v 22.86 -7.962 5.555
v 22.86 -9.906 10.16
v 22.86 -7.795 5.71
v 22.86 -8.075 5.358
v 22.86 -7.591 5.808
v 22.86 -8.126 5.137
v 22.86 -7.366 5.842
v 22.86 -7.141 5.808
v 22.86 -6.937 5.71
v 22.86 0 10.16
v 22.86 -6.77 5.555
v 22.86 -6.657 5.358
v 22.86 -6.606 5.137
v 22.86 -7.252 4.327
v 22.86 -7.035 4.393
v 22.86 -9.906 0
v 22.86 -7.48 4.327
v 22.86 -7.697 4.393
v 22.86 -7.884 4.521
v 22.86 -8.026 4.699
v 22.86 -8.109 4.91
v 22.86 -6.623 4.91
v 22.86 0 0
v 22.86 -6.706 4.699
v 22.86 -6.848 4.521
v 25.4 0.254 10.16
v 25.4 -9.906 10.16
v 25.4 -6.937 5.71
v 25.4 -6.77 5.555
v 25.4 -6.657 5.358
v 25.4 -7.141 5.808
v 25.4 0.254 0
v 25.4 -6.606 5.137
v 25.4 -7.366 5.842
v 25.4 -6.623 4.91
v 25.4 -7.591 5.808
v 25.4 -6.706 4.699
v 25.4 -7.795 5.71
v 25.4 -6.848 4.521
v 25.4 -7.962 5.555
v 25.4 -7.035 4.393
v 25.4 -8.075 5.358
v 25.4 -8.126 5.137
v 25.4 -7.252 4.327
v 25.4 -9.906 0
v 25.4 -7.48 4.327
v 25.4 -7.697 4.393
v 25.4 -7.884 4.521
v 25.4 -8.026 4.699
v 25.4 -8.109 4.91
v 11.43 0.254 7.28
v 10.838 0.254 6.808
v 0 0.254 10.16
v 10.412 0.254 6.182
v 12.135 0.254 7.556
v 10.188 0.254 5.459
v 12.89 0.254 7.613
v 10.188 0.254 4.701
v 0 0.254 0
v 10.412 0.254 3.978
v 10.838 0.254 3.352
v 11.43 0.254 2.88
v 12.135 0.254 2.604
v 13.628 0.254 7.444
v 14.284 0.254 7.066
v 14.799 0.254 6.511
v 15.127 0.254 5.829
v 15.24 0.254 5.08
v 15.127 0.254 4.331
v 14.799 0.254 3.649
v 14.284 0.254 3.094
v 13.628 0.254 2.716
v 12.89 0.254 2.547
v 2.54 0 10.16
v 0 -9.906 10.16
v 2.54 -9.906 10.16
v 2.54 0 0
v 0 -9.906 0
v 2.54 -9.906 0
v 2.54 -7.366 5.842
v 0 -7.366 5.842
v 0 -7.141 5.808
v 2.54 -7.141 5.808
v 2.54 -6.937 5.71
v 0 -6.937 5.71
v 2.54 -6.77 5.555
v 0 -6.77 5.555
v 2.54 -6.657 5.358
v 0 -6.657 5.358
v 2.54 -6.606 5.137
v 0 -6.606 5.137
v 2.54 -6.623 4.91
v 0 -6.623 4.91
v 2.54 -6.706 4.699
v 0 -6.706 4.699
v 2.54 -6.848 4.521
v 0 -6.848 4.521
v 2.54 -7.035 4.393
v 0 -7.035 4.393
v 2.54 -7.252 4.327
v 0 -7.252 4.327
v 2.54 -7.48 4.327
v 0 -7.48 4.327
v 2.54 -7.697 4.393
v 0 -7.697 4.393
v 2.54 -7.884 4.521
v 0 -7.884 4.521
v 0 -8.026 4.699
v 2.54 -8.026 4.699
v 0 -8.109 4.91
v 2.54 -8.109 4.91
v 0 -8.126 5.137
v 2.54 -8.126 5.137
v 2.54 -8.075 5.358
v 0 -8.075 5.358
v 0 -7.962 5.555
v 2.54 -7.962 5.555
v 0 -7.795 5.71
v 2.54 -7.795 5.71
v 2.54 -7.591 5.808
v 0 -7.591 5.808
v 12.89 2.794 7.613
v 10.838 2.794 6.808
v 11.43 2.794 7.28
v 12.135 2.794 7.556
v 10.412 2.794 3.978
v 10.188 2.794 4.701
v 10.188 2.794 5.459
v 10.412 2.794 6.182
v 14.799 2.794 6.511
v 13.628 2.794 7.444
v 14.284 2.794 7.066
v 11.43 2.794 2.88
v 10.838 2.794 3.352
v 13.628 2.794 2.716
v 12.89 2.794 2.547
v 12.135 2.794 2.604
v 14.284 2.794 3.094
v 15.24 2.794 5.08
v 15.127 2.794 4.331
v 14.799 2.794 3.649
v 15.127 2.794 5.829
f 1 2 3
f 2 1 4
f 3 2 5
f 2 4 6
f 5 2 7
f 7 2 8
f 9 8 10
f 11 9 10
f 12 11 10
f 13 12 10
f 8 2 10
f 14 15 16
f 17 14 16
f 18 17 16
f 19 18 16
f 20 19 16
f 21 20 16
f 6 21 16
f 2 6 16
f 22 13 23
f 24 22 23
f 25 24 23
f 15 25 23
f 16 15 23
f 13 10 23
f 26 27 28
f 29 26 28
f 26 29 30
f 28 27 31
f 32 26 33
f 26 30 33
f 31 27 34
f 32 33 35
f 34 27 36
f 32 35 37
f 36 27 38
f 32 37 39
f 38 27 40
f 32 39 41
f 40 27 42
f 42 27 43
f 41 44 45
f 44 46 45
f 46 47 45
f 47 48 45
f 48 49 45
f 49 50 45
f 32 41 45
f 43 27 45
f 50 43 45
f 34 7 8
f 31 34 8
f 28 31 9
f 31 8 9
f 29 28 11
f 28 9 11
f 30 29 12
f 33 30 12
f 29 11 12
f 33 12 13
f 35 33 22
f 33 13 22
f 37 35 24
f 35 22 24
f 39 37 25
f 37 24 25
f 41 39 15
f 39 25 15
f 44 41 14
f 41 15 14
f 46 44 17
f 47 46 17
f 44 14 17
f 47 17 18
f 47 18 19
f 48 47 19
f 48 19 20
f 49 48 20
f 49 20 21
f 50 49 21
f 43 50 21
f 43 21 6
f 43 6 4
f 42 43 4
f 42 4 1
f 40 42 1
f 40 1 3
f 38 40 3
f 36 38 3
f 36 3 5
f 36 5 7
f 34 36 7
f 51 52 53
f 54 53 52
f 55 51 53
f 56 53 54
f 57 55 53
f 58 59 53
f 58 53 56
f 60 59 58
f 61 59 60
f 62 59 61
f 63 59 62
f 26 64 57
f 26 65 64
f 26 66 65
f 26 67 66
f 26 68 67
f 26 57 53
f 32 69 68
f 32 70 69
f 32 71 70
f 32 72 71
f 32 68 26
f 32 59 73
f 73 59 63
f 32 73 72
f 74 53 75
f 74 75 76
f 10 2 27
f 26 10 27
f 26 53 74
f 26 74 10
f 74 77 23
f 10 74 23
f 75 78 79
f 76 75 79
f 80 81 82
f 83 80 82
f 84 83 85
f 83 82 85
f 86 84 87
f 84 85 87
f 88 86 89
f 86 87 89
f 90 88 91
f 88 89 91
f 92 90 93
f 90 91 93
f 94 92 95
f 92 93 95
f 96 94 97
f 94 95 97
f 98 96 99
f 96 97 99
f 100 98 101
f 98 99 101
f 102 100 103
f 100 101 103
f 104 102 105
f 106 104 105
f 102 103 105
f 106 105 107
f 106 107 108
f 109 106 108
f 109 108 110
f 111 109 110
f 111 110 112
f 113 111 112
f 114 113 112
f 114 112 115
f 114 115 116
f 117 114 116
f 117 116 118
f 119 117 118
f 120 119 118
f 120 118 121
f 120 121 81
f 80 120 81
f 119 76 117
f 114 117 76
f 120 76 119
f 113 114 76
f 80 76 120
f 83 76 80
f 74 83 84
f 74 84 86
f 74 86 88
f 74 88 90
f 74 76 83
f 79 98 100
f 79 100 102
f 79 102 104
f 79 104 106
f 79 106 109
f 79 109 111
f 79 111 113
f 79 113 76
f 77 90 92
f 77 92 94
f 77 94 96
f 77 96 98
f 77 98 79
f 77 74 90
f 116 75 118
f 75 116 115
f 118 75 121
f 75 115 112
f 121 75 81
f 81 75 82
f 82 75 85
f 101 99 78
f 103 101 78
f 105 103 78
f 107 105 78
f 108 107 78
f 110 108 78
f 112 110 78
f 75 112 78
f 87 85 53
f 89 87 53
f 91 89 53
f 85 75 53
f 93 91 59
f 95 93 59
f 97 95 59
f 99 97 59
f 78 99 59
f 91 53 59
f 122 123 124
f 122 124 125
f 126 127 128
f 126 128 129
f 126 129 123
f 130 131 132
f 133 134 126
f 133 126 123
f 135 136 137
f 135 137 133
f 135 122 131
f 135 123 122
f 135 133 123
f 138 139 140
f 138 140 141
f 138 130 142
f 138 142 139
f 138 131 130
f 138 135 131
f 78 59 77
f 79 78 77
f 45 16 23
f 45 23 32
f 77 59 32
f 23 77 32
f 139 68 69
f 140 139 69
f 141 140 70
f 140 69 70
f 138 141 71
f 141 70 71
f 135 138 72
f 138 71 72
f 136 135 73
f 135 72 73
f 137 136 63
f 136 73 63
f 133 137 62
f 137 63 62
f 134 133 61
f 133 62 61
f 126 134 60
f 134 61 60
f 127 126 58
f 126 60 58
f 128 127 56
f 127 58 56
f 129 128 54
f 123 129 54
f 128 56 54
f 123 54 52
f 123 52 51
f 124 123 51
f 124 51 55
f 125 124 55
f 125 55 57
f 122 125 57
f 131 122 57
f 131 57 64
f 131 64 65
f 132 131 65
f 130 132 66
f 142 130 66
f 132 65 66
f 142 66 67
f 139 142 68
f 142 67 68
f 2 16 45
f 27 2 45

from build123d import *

# Parameters (mm, degrees)
SKETCH1_W           = 25.4
SKETCH1_H           = 10.16
BOSS_EXTRUDE2_DEPTH = 0.254
SKETCH2_R           = 2.54
BOSS_EXTRUDE3_DEPTH = 2.54
SKETCH3_W           = 2.54
SKETCH3_H           = 10.16
BOSS_EXTRUDE4_DEPTH = 10.16
SKETCH4_R           = 0.762
CUT_EXTRUDE2_DEPTH  = 25.4


with BuildPart() as part:
    # Sketch1 → Boss-Extrude2 (new body)
    with BuildSketch(Plane(origin=(0, 0, 0), x_dir=(1, 0, 0), z_dir=(0, 1, 0))):
        with Locations((12.7, -5.08)):
            Rectangle(SKETCH1_W, SKETCH1_H)
    extrude(amount=BOSS_EXTRUDE2_DEPTH)

    # Sketch2 → Boss-Extrude3 (add)
    with BuildSketch(Plane(origin=(0, 0.254, 0), x_dir=(1, 0, 0), z_dir=(0, 1, 0))):
        with Locations((12.7, -5.08)):
            Circle(SKETCH2_R)
    extrude(amount=BOSS_EXTRUDE3_DEPTH)

    # Sketch3 → Boss-Extrude4 (add)
    with BuildSketch(Plane(origin=(0, 0.254, 0), x_dir=(1, 0, 0), z_dir=(0, 1, 0))):
        with Locations((1.27, -5.08)):
            Rectangle(SKETCH3_W, SKETCH3_H)
        with Locations((24.13, -5.08)):
            Rectangle(SKETCH3_W, SKETCH3_H)
    extrude(amount=-BOSS_EXTRUDE4_DEPTH)

    # Sketch4 → Cut-Extrude2 (cut)
    with BuildSketch(Plane.ZY):
        with Locations((5.08, -7.366)):
            Circle(SKETCH4_R)
    extrude(amount=-CUT_EXTRUDE2_DEPTH, mode=Mode.SUBTRACT)


solid = part.part
